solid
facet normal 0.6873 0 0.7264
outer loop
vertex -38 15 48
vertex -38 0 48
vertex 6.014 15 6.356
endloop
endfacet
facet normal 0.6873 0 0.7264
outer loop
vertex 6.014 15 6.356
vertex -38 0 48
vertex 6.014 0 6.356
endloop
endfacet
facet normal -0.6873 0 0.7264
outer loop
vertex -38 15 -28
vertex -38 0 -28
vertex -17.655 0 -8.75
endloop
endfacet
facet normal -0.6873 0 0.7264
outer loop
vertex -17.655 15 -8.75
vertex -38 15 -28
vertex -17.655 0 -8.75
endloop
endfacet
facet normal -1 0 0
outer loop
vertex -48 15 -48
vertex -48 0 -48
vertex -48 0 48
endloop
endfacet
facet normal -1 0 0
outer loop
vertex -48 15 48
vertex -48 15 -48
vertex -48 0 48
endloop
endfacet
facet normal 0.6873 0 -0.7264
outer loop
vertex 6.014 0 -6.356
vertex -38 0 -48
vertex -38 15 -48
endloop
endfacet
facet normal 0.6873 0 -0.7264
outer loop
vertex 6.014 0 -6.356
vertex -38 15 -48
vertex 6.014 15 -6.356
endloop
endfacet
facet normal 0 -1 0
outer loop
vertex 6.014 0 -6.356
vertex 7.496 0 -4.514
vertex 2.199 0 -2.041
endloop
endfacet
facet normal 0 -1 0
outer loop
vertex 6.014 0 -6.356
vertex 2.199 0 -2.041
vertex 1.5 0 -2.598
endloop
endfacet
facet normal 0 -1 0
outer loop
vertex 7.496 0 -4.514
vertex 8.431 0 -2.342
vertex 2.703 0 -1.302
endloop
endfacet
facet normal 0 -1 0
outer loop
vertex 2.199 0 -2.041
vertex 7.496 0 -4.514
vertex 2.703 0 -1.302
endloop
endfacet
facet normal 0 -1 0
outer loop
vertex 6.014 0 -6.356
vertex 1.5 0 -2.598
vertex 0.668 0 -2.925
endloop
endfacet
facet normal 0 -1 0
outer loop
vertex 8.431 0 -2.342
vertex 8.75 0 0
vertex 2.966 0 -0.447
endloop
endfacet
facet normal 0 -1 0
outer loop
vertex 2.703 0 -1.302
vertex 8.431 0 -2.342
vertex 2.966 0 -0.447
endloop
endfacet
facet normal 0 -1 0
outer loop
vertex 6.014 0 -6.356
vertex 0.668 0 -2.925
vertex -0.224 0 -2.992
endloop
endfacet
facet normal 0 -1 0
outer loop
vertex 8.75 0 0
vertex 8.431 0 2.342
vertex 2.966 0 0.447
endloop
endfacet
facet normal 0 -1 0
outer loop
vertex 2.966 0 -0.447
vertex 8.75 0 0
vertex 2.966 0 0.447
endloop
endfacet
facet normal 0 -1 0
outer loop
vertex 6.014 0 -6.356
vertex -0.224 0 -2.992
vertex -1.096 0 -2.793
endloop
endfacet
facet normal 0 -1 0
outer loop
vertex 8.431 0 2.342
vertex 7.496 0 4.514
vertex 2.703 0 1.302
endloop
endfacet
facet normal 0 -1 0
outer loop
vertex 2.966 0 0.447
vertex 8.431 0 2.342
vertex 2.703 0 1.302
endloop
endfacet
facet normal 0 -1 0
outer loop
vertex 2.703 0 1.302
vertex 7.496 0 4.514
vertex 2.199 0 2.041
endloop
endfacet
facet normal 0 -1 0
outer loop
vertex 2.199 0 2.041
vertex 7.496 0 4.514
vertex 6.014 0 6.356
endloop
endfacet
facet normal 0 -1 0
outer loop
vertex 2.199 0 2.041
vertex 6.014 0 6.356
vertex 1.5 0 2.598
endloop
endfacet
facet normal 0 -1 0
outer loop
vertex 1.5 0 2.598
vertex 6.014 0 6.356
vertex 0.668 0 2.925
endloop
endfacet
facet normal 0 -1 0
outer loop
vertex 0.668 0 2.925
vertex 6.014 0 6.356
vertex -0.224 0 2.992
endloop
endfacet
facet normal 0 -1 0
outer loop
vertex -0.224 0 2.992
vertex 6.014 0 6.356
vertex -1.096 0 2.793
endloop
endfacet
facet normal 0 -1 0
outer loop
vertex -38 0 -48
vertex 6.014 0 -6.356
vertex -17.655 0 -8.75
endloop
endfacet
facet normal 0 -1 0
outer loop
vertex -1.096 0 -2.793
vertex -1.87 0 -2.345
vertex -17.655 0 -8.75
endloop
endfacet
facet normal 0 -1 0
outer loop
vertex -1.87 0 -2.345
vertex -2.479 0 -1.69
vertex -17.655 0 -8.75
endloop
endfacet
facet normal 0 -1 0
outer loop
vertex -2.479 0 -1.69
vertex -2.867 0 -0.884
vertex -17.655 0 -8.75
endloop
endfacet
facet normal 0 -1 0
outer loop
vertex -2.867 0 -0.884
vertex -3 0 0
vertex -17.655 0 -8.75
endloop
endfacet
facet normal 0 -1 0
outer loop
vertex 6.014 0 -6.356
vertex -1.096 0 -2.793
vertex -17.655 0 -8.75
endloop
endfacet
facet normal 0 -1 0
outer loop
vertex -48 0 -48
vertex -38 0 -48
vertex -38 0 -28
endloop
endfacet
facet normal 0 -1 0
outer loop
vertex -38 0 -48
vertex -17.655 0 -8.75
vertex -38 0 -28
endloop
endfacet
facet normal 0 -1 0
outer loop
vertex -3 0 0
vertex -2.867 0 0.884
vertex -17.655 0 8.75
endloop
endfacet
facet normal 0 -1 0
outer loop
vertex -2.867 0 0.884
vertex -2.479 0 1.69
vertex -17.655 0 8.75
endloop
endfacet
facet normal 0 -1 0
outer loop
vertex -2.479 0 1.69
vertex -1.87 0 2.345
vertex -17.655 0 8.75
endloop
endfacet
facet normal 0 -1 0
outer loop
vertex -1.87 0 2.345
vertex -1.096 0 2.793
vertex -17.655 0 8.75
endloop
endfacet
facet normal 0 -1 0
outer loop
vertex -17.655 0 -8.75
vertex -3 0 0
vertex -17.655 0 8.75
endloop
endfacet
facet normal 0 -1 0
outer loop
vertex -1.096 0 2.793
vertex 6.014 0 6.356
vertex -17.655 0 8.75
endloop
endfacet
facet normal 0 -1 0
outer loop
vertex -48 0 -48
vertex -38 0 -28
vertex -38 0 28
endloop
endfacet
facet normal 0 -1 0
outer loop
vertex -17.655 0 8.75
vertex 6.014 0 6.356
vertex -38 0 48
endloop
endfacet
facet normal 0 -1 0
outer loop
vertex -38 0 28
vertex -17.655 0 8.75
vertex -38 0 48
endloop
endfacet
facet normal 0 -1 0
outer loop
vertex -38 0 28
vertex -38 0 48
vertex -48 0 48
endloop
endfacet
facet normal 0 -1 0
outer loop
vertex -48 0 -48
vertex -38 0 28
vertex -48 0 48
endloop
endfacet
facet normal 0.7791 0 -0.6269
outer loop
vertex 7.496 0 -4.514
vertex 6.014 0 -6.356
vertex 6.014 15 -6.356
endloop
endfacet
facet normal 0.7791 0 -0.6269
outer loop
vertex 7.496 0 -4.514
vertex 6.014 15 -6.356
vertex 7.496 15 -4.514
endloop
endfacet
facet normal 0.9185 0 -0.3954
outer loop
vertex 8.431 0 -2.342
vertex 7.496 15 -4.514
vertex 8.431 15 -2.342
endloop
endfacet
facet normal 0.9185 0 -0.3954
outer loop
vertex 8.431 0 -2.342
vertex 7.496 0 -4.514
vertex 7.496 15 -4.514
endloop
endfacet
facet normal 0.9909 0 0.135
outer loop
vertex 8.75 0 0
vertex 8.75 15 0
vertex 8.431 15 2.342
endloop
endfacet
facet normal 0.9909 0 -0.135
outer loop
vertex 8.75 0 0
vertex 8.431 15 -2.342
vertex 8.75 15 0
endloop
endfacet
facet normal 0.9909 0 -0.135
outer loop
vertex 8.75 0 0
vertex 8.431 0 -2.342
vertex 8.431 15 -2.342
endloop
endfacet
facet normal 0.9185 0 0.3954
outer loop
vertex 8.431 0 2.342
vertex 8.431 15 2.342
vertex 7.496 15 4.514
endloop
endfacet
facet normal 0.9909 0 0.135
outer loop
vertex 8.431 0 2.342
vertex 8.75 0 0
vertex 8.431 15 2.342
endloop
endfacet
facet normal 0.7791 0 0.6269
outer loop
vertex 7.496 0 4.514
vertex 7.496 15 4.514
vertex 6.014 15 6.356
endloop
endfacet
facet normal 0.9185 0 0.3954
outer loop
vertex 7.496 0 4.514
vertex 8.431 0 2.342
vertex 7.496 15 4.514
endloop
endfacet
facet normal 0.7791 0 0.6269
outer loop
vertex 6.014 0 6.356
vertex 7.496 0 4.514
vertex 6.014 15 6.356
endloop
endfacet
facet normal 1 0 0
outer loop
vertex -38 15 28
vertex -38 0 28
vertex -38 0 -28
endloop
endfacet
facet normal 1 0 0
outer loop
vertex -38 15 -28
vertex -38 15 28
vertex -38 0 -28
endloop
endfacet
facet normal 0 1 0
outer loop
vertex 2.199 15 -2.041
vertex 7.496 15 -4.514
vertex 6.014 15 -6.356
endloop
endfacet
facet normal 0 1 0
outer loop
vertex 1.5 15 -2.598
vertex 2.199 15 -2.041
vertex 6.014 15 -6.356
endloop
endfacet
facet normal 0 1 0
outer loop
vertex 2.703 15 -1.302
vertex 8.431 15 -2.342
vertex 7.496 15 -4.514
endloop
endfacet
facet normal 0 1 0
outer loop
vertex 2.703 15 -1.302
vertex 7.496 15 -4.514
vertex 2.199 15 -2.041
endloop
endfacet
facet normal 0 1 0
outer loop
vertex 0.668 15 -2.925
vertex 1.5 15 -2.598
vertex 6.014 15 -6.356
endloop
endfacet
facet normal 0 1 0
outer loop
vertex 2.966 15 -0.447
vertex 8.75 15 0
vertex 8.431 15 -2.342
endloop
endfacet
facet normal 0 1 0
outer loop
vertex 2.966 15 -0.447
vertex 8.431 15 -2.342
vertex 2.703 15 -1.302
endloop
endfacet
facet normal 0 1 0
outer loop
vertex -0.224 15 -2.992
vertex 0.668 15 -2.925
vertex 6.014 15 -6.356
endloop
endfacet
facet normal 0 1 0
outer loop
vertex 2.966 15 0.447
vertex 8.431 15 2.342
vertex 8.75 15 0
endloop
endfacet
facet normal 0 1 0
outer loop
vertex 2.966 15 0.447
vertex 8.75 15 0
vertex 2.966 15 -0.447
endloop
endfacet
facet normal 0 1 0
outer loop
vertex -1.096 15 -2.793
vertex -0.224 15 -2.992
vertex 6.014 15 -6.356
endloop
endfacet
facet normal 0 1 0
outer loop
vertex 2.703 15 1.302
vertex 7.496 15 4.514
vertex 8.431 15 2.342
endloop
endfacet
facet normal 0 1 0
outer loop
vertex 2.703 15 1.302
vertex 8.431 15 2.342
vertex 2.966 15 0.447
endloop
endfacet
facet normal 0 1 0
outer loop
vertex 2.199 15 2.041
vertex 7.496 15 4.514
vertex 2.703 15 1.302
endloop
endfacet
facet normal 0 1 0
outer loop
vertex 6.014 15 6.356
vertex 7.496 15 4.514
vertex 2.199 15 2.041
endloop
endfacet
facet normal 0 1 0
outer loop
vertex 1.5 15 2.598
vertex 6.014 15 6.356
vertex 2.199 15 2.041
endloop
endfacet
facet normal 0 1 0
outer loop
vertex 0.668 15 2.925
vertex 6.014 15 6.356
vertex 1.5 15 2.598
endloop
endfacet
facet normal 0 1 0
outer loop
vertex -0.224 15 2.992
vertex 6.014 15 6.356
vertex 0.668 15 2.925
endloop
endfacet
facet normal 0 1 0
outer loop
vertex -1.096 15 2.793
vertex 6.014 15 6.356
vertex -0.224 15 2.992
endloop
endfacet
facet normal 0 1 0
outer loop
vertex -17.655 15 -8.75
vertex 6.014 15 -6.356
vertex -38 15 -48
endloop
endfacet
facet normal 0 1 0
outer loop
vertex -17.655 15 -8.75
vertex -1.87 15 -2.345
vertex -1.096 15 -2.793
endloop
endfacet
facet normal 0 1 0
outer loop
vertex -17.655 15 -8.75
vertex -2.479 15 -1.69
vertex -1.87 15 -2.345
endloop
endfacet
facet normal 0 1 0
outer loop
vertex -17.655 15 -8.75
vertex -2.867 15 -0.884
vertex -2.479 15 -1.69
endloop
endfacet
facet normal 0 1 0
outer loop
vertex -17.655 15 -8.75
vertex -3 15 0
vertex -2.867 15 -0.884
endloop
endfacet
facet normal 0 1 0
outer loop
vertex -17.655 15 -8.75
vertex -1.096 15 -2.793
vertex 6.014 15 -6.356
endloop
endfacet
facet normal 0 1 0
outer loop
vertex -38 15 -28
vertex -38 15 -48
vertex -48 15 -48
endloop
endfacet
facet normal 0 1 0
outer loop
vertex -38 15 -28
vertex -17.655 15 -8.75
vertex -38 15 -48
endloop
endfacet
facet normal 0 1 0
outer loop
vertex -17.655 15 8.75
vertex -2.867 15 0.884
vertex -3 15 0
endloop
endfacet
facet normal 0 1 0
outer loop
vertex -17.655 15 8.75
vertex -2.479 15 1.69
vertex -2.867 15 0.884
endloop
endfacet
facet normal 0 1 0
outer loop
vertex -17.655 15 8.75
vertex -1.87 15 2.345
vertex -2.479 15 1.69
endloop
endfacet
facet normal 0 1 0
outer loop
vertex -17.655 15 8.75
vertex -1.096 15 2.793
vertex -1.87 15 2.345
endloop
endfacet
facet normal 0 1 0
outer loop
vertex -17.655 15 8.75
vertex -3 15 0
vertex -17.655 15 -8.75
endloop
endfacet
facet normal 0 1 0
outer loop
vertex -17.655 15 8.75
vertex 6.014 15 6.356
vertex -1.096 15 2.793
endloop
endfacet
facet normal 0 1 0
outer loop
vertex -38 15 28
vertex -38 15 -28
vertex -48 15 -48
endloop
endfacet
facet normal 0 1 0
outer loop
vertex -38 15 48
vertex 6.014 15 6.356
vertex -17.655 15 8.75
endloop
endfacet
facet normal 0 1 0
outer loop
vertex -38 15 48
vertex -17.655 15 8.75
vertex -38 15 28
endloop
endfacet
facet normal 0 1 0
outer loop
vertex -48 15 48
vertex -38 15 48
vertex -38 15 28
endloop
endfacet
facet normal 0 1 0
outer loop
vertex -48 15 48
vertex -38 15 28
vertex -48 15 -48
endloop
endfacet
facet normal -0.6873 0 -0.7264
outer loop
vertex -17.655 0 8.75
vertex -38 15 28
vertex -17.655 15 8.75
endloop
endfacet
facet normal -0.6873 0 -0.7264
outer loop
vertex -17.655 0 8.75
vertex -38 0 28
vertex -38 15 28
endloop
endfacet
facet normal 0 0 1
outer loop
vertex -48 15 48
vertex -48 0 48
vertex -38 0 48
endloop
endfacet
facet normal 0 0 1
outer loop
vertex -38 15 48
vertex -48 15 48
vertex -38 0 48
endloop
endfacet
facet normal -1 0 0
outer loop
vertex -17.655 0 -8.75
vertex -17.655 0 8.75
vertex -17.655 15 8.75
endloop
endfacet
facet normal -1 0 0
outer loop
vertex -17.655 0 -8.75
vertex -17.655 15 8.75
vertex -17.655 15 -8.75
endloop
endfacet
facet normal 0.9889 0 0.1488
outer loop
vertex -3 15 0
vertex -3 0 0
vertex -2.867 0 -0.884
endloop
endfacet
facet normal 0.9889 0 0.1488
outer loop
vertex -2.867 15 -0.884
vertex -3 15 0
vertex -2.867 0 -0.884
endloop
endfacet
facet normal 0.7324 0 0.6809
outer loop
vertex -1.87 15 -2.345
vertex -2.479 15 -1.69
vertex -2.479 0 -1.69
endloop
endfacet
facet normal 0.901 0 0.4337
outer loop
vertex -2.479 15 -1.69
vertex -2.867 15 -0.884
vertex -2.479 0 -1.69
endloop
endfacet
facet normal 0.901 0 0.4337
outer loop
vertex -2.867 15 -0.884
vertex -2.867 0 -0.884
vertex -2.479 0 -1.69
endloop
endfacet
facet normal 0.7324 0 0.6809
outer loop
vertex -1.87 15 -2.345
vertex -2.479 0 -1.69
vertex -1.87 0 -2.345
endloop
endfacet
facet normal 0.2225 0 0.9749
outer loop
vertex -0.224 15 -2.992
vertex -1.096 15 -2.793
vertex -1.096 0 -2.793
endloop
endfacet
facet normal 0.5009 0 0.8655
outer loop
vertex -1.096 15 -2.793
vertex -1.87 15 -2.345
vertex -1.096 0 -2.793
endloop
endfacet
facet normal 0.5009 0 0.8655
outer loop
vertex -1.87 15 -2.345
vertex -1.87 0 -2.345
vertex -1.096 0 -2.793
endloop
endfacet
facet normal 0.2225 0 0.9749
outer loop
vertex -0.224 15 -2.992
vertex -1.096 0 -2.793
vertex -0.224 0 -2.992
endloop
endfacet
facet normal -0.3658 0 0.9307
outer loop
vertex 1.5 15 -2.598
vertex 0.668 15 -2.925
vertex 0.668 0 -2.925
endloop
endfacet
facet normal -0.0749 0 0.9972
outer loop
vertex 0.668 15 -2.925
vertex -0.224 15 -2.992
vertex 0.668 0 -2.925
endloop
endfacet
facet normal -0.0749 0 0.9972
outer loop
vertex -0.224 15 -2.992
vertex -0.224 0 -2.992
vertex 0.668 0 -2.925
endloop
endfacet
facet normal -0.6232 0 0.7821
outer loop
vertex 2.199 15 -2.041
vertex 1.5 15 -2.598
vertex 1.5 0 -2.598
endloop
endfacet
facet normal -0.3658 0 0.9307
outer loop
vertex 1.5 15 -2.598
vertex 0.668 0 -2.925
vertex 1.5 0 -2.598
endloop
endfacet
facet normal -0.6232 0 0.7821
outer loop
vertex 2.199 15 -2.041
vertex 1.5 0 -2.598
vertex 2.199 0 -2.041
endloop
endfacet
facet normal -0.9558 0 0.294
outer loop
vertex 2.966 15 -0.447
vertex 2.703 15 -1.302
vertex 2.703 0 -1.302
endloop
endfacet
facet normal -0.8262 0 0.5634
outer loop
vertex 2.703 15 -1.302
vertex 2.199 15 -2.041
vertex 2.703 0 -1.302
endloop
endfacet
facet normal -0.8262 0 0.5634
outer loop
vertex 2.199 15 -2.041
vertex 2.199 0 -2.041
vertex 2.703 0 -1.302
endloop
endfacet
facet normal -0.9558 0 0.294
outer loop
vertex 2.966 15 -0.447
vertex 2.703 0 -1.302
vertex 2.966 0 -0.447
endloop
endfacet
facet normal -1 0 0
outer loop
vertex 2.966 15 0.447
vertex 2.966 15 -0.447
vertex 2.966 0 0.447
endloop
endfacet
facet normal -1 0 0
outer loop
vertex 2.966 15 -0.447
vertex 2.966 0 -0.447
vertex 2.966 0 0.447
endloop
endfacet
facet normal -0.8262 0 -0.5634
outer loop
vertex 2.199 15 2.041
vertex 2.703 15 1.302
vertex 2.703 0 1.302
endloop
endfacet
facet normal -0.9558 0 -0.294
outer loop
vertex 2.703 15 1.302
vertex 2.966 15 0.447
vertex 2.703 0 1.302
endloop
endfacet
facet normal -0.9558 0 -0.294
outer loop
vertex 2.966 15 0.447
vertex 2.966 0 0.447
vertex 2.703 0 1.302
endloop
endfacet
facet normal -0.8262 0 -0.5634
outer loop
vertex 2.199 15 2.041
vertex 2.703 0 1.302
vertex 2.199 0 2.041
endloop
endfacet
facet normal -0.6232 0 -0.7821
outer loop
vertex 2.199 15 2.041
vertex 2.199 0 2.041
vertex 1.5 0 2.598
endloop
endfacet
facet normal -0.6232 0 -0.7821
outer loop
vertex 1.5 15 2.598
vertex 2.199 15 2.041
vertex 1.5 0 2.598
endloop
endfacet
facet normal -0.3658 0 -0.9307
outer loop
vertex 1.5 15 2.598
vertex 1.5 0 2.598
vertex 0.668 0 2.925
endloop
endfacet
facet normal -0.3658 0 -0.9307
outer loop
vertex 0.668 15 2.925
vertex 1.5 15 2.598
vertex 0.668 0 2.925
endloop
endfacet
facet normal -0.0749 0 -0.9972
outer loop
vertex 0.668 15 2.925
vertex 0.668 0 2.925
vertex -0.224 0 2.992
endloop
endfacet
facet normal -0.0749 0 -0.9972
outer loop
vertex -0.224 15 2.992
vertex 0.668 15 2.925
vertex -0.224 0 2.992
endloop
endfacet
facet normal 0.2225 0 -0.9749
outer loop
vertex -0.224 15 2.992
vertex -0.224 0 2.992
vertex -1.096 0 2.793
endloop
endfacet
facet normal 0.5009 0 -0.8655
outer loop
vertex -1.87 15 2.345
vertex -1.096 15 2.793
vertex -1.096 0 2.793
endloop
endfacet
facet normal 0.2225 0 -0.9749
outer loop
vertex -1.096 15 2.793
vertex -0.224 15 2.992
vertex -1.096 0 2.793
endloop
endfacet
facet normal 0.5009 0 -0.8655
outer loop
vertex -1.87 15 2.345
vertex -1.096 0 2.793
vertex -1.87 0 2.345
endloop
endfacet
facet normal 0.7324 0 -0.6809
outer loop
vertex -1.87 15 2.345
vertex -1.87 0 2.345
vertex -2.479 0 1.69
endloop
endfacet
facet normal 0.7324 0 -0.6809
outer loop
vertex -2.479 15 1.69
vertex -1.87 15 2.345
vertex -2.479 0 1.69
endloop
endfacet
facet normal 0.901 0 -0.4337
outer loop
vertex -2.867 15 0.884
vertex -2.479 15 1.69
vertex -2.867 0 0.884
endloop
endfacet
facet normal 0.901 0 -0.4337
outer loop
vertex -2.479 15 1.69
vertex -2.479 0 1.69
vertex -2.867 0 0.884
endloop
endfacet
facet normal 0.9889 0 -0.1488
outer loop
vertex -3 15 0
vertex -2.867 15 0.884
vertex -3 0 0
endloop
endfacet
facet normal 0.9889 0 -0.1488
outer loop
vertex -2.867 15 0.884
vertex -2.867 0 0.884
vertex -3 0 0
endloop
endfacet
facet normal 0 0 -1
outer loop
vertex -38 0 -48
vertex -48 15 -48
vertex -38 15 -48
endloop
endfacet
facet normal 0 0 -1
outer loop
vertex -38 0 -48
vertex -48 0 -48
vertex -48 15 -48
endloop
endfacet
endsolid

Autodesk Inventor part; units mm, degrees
ref_plane "YZ Plane" through (0, 0, 0) normal (1, 0, 0) x (0, 1, 0)
ref_plane "XZ Plane" through (0, 0, 0) normal (0, 1, 0) x (-1, 0, 0)
ref_plane "XY Plane" through (0, 0, 0) normal (0, 0, 1) x (1, 0, 0)
sketch "Sketch1" plane through (0, 0, 0) normal (0, 1, 0) x (-1, 0, 0)
  circle A0 centre (0, 0) radius 3
  circle A1 centre (0, 0) radius 8.75
  line L0 (0, 0) -> (48, 0) construction
  line L1 (48, 48) -> (48, -48) construction
  line L2 (48, 48) -> (38, 48)
  line L3 (38, 48) -> (38, 28)
  line L4 (38, 28) -> (48, 28)
  line L5 (48, 28) -> (48, 48)
  line L6 (38, 48) -> (-6.0137, 6.3559)
  line L7 (38, 28) -> (17.6546, 8.75)
  line L8 (17.6546, 8.75) -> (17.6546, 0)
  line L9 (48, -48) -> (38, -48)
  line L10 (38, -48) -> (38, -28)
  line L11 (38, -28) -> (48, -28)
  line L12 (48, -28) -> (48, -48)
  line L13 (38, -48) -> (-6.0137, -6.3559)
  line L14 (38, -28) -> (17.6546, -8.75)
  line L15 (17.6546, -8.75) -> (17.6546, 0)
  line L16 (48, 28) -> (38, 28)
  line L17 (38, 28) -> (38, -28)
  line L18 (38, -28) -> (48, -28)
  line L19 (48, -28) -> (48, 28)
  dimension "d1" = 17.5
  dimension "d0" = 6
  dimension "d2" = 48
  dimension "d3" = 96
  dimension "d4" = 10
  dimension "d5" = 20
  dimension "d6" = 17.5
extrude "Extrusion1" add sketch "Sketch1" along normal blind 15 contours A1 | A1 L6 L3 L7 L8 L15 L14 L10 L13 | L2 L5 L4 L3 | L10 L11 L12 L9 | L4 L19 L11 L17
ref_plane "Work Plane1" through (0.0004, 0, -8.75) normal (-1, 0, 0) x (0, 0, 1)
properties part number "Custom Wheel Mount"
